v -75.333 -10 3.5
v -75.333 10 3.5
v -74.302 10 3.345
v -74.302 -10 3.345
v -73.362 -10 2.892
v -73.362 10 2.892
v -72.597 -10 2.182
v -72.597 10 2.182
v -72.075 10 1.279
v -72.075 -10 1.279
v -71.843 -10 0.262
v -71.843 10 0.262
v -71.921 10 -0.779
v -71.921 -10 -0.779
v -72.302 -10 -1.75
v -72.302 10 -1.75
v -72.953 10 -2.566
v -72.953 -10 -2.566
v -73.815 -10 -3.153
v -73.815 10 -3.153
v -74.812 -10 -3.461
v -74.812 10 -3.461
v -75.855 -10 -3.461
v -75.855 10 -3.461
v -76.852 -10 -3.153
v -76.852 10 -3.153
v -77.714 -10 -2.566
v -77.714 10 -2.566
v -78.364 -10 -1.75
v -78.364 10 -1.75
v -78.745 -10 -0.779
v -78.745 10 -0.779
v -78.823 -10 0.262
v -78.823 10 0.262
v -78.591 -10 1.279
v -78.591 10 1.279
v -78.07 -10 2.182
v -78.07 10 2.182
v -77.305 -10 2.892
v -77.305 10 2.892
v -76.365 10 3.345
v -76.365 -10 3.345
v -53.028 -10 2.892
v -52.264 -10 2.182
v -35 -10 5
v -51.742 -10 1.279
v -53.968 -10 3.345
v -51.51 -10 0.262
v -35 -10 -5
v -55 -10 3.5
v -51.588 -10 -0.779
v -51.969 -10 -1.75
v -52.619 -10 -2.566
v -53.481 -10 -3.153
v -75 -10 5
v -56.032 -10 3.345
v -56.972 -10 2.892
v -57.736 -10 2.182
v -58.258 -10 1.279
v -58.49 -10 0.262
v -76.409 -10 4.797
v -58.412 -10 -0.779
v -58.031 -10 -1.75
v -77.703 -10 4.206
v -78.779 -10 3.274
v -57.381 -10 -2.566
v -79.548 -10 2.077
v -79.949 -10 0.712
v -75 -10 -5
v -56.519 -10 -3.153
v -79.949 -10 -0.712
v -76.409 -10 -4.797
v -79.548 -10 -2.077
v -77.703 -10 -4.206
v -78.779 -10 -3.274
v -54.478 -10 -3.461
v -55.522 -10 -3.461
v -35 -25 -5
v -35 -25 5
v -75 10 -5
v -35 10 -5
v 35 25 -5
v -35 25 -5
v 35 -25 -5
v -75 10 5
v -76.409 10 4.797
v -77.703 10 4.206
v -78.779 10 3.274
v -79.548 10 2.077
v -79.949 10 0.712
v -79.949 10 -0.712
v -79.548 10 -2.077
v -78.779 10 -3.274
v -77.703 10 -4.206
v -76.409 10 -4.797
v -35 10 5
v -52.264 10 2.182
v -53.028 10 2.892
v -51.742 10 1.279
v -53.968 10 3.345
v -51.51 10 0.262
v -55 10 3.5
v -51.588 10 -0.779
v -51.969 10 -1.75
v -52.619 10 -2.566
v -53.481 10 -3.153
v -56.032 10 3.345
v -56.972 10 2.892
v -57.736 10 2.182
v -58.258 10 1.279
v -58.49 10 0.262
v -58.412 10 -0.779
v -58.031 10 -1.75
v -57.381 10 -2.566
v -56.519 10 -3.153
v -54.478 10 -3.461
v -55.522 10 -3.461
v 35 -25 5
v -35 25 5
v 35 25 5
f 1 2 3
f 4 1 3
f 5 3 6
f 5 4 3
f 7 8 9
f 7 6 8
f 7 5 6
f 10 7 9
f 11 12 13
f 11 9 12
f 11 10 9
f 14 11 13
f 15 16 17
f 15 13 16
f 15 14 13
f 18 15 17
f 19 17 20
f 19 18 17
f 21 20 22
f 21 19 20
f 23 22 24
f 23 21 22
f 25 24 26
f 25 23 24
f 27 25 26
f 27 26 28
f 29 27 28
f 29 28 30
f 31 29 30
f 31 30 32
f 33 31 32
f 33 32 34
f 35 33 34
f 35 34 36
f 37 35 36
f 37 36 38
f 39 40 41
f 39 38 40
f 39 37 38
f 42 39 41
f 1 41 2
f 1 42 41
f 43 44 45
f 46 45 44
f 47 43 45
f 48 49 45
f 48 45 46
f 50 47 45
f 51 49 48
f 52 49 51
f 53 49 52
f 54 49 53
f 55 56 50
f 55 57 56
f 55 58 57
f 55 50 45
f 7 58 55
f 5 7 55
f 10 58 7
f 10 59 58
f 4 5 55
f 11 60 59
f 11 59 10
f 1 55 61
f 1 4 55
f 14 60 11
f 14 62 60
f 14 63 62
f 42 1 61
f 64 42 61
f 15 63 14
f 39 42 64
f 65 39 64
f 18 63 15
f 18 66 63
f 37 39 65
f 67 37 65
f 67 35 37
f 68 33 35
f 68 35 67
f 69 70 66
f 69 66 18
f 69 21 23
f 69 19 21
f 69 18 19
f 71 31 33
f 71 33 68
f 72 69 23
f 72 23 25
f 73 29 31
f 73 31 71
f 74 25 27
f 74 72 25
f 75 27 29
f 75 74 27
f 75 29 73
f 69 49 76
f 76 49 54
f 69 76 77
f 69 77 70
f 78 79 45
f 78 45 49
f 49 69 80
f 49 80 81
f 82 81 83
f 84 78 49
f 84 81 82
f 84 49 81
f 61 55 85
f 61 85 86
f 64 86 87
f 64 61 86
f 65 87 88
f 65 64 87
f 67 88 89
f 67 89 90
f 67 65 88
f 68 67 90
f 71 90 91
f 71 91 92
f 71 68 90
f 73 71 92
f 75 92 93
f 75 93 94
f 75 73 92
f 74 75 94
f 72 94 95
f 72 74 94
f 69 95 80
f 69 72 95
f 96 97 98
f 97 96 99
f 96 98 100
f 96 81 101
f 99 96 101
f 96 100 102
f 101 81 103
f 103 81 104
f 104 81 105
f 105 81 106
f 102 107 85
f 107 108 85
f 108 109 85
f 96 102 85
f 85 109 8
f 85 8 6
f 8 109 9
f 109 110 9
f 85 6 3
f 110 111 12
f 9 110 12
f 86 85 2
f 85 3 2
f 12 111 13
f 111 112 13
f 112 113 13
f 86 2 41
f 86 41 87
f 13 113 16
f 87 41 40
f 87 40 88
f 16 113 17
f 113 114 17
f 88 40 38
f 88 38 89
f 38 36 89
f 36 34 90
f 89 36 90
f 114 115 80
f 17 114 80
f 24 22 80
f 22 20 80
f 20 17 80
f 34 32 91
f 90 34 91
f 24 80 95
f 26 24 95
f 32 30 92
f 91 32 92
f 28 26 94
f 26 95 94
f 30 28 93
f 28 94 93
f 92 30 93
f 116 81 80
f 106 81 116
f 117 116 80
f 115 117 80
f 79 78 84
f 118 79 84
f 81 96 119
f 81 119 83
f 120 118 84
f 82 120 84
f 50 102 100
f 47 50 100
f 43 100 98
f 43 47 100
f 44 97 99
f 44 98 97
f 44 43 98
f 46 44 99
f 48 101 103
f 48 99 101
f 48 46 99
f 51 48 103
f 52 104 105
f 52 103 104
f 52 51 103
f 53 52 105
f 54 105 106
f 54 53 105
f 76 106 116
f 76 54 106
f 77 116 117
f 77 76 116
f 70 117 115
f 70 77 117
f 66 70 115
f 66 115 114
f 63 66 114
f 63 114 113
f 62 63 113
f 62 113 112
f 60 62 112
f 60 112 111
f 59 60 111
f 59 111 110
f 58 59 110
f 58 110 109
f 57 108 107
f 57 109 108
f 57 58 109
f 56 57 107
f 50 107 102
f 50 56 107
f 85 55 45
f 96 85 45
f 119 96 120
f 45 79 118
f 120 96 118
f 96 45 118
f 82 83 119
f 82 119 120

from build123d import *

# Parameters (mm, degrees)
BOSS_EXTRUDE1_DEPTH      = 25
BOSS_EXTRUDE1_DEPTH_BACK = 25
SKETCH1_W                = 70
SKETCH1_H                = 10
BOSS_EXTRUDE2_DEPTH      = 10
BOSS_EXTRUDE2_DEPTH_BACK = 10
CUT_EXTRUDE1_DEPTH       = 19
CUT_EXTRUDE1_DEPTH_BACK  = 16
SKETCH3_R                = 3.5


with BuildPart() as part:
    # Sketch1 → Boss-Extrude1 (new, two sides: drawn at the far end of the back side and taken through both)
    with BuildSketch(Plane(origin=(0, 0, 0), x_dir=(1, 0, 0), z_dir=(0, 1, 0)).offset(-BOSS_EXTRUDE1_DEPTH_BACK)):
        Rectangle(SKETCH1_W, SKETCH1_H)
    extrude(amount=BOSS_EXTRUDE1_DEPTH + BOSS_EXTRUDE1_DEPTH_BACK)

    # Sketch2 → Boss-Extrude2 (add, two sides: drawn at the far end of the back side and taken through both)
    with BuildSketch(Plane(origin=(0, 0, 0), x_dir=(1, 0, 0), z_dir=(0, 1, 0)).offset(-BOSS_EXTRUDE2_DEPTH_BACK)):
        with BuildLine():
            Line((-75, 5), (-35, 5))
            Line((-35, 5), (-35, -5))
            Line((-35, -5), (-75, -5))
            ThreePointArc((-75, -5), (-80, 0), (-75, 5))
        make_face()
    extrude(amount=BOSS_EXTRUDE2_DEPTH + BOSS_EXTRUDE2_DEPTH_BACK)

    # Sketch3 → Cut-Extrude1 (cut, two sides: drawn at the far end of the back side and taken through both)
    with BuildSketch(Plane(origin=(0, 0, 0), x_dir=(1, 0, 0), z_dir=(0, 1, 0)).offset(-CUT_EXTRUDE1_DEPTH_BACK)):
        with Locations((-75.333177097, 0)):
            Circle(SKETCH3_R)
        with Locations((-55, 0)):
            Circle(SKETCH3_R)
    extrude(amount=CUT_EXTRUDE1_DEPTH + CUT_EXTRUDE1_DEPTH_BACK, mode=Mode.SUBTRACT)


solid = part.part
